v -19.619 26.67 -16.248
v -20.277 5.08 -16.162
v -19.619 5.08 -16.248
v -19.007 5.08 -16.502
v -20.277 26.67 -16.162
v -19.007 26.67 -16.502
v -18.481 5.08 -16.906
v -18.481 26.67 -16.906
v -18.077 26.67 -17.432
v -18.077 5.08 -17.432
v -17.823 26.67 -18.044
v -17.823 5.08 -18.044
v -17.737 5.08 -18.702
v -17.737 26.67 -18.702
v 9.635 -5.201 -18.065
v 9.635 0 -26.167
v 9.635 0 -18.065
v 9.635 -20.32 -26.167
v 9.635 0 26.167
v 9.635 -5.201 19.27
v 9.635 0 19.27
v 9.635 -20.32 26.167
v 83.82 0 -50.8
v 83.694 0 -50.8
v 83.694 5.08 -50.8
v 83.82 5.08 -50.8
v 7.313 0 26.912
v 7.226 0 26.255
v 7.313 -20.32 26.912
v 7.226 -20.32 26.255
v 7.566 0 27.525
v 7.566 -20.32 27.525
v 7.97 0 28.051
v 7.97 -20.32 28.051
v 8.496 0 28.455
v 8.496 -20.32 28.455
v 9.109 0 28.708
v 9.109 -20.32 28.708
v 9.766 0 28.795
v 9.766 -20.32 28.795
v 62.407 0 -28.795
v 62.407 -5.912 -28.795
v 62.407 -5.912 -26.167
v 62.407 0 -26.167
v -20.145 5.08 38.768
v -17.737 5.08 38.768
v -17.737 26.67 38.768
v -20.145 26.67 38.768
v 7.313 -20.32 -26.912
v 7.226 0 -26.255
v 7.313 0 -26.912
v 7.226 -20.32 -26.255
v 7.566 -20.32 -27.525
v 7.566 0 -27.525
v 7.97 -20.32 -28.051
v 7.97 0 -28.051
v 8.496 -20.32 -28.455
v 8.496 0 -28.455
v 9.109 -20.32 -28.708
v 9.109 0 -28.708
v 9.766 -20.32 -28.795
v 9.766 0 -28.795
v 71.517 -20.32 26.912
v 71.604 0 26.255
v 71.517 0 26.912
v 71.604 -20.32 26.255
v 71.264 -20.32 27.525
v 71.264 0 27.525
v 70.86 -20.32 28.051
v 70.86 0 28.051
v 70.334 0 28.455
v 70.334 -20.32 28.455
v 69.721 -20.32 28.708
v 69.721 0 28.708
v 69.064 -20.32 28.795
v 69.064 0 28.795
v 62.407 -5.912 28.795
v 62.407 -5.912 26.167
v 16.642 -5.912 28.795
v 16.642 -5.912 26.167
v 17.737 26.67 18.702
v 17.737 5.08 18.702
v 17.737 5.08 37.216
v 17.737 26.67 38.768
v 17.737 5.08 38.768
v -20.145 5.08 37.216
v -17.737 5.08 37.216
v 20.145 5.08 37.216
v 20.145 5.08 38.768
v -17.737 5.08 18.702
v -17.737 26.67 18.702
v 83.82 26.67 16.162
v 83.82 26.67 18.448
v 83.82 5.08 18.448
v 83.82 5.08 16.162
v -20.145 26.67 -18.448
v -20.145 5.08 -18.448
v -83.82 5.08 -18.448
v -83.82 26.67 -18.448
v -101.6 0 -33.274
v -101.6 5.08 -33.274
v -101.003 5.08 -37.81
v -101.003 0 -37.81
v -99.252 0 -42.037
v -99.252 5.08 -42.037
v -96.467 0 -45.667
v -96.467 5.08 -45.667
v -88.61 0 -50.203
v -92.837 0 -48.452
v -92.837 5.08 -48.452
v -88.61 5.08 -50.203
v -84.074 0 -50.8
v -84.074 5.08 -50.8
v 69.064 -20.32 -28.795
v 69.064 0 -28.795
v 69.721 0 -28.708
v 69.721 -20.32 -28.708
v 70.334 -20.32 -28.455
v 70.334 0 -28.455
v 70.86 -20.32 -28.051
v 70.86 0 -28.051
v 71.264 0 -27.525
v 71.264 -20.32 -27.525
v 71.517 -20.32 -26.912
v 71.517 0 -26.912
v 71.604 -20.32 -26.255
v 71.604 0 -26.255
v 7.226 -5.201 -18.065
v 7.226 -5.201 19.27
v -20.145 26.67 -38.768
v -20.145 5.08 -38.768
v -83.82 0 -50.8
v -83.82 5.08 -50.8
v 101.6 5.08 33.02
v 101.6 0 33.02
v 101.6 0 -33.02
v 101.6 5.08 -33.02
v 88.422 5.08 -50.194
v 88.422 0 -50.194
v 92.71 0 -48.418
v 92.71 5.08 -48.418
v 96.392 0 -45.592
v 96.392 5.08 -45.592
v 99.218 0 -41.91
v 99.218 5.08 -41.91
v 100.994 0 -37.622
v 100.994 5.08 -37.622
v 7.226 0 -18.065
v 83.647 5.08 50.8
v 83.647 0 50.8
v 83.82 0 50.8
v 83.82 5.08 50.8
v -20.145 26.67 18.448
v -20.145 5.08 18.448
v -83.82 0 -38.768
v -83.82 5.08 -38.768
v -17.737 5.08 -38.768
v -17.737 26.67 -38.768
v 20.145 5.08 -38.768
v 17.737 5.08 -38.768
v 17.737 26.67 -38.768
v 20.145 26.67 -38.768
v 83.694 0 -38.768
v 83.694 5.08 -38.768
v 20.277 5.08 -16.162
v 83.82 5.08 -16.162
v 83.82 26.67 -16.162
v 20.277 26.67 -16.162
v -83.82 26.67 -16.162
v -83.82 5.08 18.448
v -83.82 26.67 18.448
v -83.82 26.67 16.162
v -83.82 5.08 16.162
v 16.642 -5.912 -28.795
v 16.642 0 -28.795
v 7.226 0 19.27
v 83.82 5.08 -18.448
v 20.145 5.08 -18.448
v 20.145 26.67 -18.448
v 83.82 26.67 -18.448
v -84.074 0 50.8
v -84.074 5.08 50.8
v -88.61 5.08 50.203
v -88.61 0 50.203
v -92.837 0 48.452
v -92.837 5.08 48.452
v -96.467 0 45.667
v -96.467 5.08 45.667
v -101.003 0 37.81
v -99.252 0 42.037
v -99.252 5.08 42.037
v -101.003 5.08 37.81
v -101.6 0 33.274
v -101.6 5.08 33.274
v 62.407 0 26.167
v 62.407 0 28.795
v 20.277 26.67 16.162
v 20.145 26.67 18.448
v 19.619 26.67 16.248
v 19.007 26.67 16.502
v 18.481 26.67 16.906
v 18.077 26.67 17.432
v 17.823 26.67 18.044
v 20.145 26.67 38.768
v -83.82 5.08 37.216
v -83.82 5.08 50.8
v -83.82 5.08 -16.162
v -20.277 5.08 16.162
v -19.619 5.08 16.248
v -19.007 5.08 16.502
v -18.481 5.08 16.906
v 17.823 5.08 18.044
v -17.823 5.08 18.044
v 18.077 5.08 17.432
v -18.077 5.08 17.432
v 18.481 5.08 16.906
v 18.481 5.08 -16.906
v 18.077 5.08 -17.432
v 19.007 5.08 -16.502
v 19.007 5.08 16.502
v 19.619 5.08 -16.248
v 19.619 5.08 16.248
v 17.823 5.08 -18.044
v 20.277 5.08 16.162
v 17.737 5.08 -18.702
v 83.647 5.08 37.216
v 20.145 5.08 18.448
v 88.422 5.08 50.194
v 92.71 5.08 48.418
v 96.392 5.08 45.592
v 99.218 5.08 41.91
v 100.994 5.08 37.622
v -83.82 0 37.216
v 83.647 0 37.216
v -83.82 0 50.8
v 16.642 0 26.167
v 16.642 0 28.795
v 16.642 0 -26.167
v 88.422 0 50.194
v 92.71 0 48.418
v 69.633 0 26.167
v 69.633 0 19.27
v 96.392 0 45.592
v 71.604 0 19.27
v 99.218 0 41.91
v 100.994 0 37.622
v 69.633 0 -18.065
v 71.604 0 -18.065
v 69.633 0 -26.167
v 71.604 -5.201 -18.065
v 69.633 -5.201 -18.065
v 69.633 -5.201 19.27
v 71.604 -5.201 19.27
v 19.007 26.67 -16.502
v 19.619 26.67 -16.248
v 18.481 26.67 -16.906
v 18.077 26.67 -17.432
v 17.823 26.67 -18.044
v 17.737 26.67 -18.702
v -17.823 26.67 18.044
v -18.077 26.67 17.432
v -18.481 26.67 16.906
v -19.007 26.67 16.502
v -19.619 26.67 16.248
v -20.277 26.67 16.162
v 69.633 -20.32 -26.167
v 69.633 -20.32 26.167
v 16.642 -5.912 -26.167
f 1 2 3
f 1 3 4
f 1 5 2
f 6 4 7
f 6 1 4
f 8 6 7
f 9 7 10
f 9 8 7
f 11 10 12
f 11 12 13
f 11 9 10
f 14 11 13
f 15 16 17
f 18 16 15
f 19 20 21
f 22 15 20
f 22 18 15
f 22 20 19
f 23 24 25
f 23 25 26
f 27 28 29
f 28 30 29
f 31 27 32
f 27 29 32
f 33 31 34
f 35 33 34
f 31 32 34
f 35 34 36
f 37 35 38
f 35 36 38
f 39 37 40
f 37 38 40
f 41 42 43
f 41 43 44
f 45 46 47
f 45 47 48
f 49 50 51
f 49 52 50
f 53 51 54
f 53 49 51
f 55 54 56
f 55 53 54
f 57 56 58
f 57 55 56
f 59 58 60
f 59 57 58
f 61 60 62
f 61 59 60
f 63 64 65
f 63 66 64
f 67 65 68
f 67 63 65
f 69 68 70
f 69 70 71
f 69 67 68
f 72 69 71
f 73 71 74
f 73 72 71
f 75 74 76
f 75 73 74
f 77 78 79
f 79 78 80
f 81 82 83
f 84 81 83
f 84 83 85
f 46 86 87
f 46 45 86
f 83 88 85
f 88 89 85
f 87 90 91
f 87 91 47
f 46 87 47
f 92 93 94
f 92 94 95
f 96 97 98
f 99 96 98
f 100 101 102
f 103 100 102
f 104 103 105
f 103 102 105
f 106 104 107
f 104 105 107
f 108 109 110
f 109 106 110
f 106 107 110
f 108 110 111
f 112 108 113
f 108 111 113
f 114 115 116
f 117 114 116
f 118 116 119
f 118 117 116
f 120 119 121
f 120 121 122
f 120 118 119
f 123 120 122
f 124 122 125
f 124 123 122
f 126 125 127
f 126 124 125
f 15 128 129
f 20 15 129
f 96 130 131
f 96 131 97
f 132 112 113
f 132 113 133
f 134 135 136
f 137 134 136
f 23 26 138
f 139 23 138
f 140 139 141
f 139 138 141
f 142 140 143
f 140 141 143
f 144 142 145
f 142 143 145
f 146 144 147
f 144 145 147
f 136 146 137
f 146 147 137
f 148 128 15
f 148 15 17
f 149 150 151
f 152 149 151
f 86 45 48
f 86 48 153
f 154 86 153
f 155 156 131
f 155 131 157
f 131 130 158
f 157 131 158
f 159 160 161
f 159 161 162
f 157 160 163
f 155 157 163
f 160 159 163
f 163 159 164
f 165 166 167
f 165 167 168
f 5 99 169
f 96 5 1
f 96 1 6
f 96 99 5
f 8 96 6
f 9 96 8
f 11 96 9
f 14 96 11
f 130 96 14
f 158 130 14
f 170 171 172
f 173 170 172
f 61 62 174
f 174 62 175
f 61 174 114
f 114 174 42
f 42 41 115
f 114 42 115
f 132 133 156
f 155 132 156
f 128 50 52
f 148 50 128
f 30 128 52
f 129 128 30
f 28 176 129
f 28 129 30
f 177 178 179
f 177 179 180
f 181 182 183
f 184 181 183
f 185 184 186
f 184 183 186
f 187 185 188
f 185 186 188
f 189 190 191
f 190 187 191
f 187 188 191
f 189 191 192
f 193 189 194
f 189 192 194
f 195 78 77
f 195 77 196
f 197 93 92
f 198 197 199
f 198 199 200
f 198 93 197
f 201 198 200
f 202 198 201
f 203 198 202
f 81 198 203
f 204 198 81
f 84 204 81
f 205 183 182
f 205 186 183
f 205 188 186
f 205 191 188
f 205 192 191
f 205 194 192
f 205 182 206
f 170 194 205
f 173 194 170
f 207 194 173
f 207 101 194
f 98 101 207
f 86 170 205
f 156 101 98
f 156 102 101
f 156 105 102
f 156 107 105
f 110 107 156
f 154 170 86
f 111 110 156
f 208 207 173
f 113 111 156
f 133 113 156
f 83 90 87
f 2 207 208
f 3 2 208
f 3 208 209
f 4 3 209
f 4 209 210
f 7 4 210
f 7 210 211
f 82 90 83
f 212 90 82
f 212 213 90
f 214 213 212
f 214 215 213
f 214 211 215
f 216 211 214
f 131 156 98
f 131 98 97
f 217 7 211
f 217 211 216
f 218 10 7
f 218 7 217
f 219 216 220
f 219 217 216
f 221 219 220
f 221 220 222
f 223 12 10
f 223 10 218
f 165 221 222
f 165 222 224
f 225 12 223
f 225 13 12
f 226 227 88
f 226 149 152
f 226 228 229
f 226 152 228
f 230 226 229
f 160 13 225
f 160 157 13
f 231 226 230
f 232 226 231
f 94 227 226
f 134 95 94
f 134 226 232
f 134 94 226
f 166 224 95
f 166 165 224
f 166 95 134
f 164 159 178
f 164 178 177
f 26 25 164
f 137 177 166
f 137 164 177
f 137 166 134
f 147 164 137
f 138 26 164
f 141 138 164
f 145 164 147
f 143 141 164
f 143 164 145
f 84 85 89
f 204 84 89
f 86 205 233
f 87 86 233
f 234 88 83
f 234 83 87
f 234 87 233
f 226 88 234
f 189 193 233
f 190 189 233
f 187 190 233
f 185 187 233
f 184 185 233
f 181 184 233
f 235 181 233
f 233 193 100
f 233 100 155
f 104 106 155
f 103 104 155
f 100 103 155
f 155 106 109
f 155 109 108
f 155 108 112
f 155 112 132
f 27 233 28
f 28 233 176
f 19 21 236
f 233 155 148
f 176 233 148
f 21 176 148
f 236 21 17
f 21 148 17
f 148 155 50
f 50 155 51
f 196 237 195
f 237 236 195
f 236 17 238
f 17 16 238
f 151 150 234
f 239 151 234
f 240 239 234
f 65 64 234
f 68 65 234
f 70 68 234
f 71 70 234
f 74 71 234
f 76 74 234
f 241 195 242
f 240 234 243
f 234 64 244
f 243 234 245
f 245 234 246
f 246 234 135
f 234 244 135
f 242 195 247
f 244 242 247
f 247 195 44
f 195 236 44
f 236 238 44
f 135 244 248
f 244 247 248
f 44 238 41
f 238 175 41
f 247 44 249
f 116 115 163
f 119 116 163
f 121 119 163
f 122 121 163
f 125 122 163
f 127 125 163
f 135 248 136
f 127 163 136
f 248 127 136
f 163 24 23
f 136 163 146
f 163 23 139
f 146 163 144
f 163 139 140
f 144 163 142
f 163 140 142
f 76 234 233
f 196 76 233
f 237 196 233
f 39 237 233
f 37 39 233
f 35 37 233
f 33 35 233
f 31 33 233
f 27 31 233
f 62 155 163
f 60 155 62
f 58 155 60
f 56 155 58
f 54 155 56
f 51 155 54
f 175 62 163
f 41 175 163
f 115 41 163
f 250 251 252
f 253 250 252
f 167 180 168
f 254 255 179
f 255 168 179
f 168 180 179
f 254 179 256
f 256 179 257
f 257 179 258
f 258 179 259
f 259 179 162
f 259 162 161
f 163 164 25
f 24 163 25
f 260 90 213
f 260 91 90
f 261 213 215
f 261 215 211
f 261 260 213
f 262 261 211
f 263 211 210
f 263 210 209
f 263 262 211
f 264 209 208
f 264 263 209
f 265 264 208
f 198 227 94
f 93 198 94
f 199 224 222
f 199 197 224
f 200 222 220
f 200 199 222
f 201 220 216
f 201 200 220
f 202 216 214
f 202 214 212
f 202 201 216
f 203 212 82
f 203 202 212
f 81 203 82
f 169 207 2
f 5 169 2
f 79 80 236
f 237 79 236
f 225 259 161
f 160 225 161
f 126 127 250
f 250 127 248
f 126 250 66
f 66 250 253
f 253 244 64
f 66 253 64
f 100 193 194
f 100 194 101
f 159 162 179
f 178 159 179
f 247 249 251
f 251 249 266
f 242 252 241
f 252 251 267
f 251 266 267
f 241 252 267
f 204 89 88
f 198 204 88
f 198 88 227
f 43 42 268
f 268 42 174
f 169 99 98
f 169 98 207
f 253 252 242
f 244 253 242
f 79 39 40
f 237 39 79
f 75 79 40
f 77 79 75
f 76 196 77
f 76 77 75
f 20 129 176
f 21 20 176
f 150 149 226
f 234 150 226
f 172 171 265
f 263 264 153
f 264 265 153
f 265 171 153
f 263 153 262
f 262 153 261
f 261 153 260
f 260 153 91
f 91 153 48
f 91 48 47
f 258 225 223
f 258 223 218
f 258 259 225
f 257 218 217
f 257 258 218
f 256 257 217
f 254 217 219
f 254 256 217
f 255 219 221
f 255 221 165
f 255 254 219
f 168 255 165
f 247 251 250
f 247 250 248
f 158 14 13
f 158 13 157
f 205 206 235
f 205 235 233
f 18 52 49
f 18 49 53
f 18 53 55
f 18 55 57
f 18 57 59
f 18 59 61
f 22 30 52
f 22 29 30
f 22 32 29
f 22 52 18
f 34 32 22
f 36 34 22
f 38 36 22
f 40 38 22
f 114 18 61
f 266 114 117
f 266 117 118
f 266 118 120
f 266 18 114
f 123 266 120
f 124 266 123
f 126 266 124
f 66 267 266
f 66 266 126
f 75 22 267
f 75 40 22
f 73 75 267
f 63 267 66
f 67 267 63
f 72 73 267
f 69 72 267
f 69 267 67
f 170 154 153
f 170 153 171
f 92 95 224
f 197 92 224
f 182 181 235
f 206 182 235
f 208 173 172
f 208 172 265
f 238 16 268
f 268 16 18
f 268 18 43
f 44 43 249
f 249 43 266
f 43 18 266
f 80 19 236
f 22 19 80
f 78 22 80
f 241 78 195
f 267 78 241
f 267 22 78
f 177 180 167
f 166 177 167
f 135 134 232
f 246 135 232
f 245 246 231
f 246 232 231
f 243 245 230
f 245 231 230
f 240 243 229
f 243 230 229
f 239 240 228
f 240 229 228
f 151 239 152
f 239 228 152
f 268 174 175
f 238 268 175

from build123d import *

# Parameters (mm, degrees)
SKETCH1_W            = 203.2
SKETCH1_H            = 101.6
BOSS_EXTRUDE1_DEPTH  = 5.08
SKETCH2_W            = 167.467297736
SKETCH2_H            = 13.584196144
CUT_EXTRUDE4_DEPTH   = 114.705788771
BOSS_EXTRUDE2_DEPTH  = 21.59
FILLET1_R            = 2.54
FILLET2_R            = 2.54
MIRROR3_COPY_1_DEPTH = 21.59
FILLET3_R            = 2.54
SKETCH5_W            = 64.377921573
SKETCH5_H            = 57.58977338
BOSS_EXTRUDE4_DEPTH  = 20.32
SKETCH6_W            = 59.998471125
SKETCH6_H            = 52.334432844
CUT_EXTRUDE5_DEPTH   = 20.32
SKETCH7_W            = 37.334815061
SKETCH7_H            = 5.20069898
CUT_EXTRUDE6_DEPTH   = 124.024580753
SKETCH8_W            = 45.765257173
SKETCH8_H            = 5.912359678
CUT_EXTRUDE7_DEPTH   = 132.792241377
FILLET4_R            = 2.54


with BuildPart() as part:
    # Sketch1 → Boss-Extrude1 (new body)
    with BuildSketch(Plane(origin=(0, 0, 0), x_dir=(1, 0, 0), z_dir=(0, 1, 0))):
        Rectangle(SKETCH1_W, SKETCH1_H)
    extrude(amount=BOSS_EXTRUDE1_DEPTH)

    # Sketch2 → Cut-Extrude4 (cut, through all)
    with BuildSketch(Plane(origin=(0, 5.08, 0), x_dir=(1, 0, 0), z_dir=(0, 1, 0))):
        Polygon((83.693773799, 50.8), (-83.82, 50.8), (-83.82, 50.443396551), (-83.82, 38.767661401), (83.693773799, 38.767661401), (83.693773799, 50.443396551), align=None)
        with BuildLine():
            Line((101.6, 50.8), (83.82, 50.8))
            ThreePointArc((83.82, 50.8), (96.392358569, 45.592358569), (101.6, 33.02))
            Line((101.6, 33.02), (101.6, 50.8))
        make_face()
        with BuildLine():
            Line((101.6, -50.8), (101.6, -33.02))
            ThreePointArc((101.6, -33.02), (96.392358569, -45.592358569), (83.82, -50.8))
            Line((83.82, -50.8), (101.6, -50.8))
        make_face()
        with BuildLine():
            ThreePointArc((-84.074, -50.8), (-96.466753447, -45.666753447), (-101.6, -33.274))
            Line((-101.6, -33.274), (-101.6, -50.8))
            Line((-101.6, -50.8), (-84.074, -50.8))
        make_face()
        with BuildLine():
            ThreePointArc((-101.6, 33.274), (-96.466753447, 45.666753447), (-84.074, 50.8))
            Line((-84.074, 50.8), (-101.6, 50.8))
            Line((-101.6, 50.8), (-101.6, 33.274))
        make_face()
        with Locations((-0.086351132, -44.007901928)):
            Rectangle(SKETCH2_W, SKETCH2_H)
    extrude(amount=-CUT_EXTRUDE4_DEPTH, mode=Mode.SUBTRACT)

    # Sketch4 → Boss-Extrude2 (add)
    with BuildSketch(Plane(origin=(0, 5.08, 0), x_dir=(1, 0, 0), z_dir=(0, 1, 0))):
        Polygon((-83.82, 16.161661401), (-17.736774311, 16.161661401), (-17.736774311, 38.767661401), (-20.145472057, 38.767661401), (-20.145472057, 18.447661401), (-83.82, 18.447661401), align=None)
    boss_extrude2 = extrude(amount=BOSS_EXTRUDE2_DEPTH)

    # Fillet1
    fillet1_edges = [part.edges().sort_by_distance(p)[0] for p in [
        (-17.736774311, 15.875, -16.161661401),
    ]]
    fillet(fillet1_edges, radius=FILLET1_R)

    # Mirror1: Boss-Extrude2 across plane
    add(boss_extrude2.mirror(Plane(origin=(0, 0, 0), x_dir=(0, 0, 1), z_dir=(1, 0, 0))))

    # Fillet2
    fillet2_edges = [part.edges().sort_by_distance(p)[0] for p in [
        (17.736774311, 15.875, -16.161661401),
    ]]
    fillet(fillet2_edges, radius=FILLET2_R)

    # Mirror3: Boss-Extrude2 across plane
    add(boss_extrude2.mirror(Plane.XY))

    # Mirror3 copy 1 sketch → Mirror3 copy 1 (add)
    with BuildSketch(Plane(origin=(0, 5.08, 0), x_dir=(-1, 0, 0), z_dir=(0, 1, 0))):
        Polygon((-83.82, 16.161661401), (-17.736774311, 16.161661401), (-17.736774311, 38.767661401), (-20.145472057, 38.767661401), (-20.145472057, 18.447661401), (-83.82, 18.447661401), align=None)
    extrude(amount=MIRROR3_COPY_1_DEPTH)

    # Fillet3
    fillet3_edges = [part.edges().sort_by_distance(p)[0] for p in [
        (-17.736774311, 15.875, 16.161661401),
        (17.736774311, 15.875, 16.161661401),
    ]]
    fillet(fillet3_edges, radius=FILLET3_R)

    # Sketch5 → Boss-Extrude4 (add)
    with BuildSketch(Plane.XZ):
        with Locations((39.415054025, 0)):
            Rectangle(SKETCH5_W, SKETCH5_H)
    extrude(amount=BOSS_EXTRUDE4_DEPTH)

    # Sketch6 → Cut-Extrude5 (cut)
    with BuildSketch(Plane.XZ.offset(20.32)):
        with Locations((39.634026547, 0)):
            Rectangle(SKETCH6_W, SKETCH6_H)
    extrude(amount=-CUT_EXTRUDE5_DEPTH, mode=Mode.SUBTRACT)

    # Sketch7 → Cut-Extrude6 (cut, through all)
    with BuildSketch(Plane.ZY.offset(-7.226093238)):
        with Locations((0.602174437, -2.60034949)):
            Rectangle(SKETCH7_W, SKETCH7_H)
    extrude(amount=-CUT_EXTRUDE6_DEPTH, mode=Mode.SUBTRACT)

    # Sketch8 → Cut-Extrude7 (cut, through all)
    with BuildSketch(Plane(origin=(0, 0, -28.79488669), x_dir=(-1, 0, 0), z_dir=(0, 0, -1))):
        with Locations((-39.524540286, -2.956179839)):
            Rectangle(SKETCH8_W, SKETCH8_H)
    extrude(amount=-CUT_EXTRUDE7_DEPTH, mode=Mode.SUBTRACT)

    # Fillet4
    fillet4_edges = [part.edges().sort_by_distance(p)[0] for p in [
        (7.226093238, -10.16, 28.79488669),
        (7.226093238, -10.16, -28.79488669),
        (71.604014811, -10.16, -28.79488669),
        (71.604014811, -10.16, 28.79488669),
    ]]
    fillet(fillet4_edges, radius=FILLET4_R)


solid = part.part
